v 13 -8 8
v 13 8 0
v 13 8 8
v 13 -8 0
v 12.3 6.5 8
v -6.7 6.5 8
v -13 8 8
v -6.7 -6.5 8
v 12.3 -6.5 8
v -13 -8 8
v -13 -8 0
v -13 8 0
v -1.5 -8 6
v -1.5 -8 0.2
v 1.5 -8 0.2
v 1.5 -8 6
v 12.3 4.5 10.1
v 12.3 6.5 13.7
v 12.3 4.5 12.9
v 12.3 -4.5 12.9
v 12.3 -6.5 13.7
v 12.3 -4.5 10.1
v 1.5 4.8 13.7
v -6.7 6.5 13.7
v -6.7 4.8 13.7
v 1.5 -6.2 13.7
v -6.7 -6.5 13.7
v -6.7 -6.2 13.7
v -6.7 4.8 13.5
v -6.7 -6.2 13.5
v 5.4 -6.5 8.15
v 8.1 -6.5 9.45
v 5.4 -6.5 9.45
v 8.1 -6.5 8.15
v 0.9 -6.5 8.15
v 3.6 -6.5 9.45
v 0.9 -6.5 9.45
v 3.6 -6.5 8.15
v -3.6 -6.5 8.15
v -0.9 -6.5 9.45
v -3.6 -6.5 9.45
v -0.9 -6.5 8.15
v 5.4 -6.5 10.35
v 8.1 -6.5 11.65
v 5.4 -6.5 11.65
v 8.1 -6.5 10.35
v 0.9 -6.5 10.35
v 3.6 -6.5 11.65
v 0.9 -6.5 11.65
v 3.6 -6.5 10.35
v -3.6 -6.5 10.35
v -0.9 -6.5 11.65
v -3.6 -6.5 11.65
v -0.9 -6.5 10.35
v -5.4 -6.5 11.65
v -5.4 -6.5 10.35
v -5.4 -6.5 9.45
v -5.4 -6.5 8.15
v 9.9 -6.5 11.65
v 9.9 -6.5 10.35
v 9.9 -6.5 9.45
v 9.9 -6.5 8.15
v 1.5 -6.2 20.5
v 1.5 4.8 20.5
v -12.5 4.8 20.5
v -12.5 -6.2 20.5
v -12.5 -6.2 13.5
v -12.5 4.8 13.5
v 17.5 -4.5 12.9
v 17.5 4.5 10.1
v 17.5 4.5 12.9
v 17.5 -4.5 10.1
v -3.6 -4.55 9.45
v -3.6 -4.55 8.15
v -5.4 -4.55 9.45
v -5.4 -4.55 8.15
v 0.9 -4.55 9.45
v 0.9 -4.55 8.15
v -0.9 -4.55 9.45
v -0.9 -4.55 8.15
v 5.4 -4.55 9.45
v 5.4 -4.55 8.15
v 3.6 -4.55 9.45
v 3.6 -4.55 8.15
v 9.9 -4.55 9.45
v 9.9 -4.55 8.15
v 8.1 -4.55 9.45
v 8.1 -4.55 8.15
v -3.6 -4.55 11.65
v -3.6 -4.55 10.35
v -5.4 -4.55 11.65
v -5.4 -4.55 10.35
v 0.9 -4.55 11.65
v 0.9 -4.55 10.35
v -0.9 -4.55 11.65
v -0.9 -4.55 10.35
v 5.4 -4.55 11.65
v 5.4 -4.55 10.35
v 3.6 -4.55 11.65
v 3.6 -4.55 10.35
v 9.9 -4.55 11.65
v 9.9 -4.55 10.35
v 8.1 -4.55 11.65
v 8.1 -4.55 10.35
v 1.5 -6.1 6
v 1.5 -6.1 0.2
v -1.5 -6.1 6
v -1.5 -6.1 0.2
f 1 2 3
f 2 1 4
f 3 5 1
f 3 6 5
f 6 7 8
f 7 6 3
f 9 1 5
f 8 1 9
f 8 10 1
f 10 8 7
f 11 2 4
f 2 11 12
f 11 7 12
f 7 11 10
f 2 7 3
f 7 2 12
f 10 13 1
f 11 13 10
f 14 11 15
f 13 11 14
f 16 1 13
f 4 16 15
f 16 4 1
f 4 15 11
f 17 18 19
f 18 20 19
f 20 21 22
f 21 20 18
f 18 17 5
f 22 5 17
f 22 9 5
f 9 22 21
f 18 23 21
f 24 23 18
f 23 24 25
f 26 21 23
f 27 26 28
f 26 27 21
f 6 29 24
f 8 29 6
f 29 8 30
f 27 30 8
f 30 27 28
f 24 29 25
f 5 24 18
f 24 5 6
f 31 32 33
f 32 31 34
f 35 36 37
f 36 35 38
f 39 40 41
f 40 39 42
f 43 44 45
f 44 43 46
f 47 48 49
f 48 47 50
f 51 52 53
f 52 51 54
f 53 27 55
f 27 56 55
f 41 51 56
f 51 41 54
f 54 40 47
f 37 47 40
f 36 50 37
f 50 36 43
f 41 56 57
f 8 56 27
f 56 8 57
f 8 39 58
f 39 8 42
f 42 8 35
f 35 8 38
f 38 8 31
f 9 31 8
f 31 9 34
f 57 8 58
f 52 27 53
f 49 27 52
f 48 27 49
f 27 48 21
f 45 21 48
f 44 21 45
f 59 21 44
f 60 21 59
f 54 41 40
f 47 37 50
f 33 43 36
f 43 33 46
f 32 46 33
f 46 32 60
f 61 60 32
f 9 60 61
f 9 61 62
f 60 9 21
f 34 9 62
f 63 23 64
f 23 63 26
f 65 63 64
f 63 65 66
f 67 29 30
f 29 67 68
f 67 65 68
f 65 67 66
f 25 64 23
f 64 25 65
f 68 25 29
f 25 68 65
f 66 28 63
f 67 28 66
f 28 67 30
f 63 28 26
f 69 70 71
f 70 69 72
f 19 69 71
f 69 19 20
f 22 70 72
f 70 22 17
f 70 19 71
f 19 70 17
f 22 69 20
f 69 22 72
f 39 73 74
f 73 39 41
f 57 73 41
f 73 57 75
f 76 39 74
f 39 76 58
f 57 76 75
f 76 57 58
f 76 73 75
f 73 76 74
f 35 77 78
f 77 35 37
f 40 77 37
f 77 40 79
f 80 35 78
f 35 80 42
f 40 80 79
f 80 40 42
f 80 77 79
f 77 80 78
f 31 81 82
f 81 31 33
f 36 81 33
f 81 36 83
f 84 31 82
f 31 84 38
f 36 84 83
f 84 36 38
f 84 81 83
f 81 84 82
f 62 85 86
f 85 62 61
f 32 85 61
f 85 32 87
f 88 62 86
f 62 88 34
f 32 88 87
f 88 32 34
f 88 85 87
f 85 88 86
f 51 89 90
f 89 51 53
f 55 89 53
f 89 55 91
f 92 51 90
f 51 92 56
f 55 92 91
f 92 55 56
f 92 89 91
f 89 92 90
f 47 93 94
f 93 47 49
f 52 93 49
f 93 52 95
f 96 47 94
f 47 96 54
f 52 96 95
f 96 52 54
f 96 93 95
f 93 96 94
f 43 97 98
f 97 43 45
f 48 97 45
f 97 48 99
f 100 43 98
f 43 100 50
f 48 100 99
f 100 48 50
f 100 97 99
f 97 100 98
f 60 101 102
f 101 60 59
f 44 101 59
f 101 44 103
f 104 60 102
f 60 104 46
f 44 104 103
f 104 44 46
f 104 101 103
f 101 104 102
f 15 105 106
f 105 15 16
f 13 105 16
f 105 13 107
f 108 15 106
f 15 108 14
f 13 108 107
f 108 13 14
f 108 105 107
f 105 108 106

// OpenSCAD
// Original, subject-neutral test fixture written for Projection Loom.
// This is NOT a copy of nosycat's CC0 Brutalist archive.
// Model units are abstract units; no surveyed scale claimed.
$fn = 18;
module massing() {
    union() {
        translate([0,0,4]) cube([26,16,8],center=true);
        translate([2.8,0,10.7]) cube([19,13,6],center=true);
        translate([-5.5,-0.7,17]) cube([14,11,7],center=true);
        translate([11,0,11.5]) cube([13,9,2.8],center=true); // cantilever
    }
}
difference() {
  massing();
  translate([0,-7.6,3.1]) cube([3.0,3.0,5.8],center=true); // entrance
  for (z=[8.8,11.0]) for (x=[-4.5,0,4.5,9])
    translate([x,-6.4,z]) cube([1.8,3.7,1.3],center=true);
}
